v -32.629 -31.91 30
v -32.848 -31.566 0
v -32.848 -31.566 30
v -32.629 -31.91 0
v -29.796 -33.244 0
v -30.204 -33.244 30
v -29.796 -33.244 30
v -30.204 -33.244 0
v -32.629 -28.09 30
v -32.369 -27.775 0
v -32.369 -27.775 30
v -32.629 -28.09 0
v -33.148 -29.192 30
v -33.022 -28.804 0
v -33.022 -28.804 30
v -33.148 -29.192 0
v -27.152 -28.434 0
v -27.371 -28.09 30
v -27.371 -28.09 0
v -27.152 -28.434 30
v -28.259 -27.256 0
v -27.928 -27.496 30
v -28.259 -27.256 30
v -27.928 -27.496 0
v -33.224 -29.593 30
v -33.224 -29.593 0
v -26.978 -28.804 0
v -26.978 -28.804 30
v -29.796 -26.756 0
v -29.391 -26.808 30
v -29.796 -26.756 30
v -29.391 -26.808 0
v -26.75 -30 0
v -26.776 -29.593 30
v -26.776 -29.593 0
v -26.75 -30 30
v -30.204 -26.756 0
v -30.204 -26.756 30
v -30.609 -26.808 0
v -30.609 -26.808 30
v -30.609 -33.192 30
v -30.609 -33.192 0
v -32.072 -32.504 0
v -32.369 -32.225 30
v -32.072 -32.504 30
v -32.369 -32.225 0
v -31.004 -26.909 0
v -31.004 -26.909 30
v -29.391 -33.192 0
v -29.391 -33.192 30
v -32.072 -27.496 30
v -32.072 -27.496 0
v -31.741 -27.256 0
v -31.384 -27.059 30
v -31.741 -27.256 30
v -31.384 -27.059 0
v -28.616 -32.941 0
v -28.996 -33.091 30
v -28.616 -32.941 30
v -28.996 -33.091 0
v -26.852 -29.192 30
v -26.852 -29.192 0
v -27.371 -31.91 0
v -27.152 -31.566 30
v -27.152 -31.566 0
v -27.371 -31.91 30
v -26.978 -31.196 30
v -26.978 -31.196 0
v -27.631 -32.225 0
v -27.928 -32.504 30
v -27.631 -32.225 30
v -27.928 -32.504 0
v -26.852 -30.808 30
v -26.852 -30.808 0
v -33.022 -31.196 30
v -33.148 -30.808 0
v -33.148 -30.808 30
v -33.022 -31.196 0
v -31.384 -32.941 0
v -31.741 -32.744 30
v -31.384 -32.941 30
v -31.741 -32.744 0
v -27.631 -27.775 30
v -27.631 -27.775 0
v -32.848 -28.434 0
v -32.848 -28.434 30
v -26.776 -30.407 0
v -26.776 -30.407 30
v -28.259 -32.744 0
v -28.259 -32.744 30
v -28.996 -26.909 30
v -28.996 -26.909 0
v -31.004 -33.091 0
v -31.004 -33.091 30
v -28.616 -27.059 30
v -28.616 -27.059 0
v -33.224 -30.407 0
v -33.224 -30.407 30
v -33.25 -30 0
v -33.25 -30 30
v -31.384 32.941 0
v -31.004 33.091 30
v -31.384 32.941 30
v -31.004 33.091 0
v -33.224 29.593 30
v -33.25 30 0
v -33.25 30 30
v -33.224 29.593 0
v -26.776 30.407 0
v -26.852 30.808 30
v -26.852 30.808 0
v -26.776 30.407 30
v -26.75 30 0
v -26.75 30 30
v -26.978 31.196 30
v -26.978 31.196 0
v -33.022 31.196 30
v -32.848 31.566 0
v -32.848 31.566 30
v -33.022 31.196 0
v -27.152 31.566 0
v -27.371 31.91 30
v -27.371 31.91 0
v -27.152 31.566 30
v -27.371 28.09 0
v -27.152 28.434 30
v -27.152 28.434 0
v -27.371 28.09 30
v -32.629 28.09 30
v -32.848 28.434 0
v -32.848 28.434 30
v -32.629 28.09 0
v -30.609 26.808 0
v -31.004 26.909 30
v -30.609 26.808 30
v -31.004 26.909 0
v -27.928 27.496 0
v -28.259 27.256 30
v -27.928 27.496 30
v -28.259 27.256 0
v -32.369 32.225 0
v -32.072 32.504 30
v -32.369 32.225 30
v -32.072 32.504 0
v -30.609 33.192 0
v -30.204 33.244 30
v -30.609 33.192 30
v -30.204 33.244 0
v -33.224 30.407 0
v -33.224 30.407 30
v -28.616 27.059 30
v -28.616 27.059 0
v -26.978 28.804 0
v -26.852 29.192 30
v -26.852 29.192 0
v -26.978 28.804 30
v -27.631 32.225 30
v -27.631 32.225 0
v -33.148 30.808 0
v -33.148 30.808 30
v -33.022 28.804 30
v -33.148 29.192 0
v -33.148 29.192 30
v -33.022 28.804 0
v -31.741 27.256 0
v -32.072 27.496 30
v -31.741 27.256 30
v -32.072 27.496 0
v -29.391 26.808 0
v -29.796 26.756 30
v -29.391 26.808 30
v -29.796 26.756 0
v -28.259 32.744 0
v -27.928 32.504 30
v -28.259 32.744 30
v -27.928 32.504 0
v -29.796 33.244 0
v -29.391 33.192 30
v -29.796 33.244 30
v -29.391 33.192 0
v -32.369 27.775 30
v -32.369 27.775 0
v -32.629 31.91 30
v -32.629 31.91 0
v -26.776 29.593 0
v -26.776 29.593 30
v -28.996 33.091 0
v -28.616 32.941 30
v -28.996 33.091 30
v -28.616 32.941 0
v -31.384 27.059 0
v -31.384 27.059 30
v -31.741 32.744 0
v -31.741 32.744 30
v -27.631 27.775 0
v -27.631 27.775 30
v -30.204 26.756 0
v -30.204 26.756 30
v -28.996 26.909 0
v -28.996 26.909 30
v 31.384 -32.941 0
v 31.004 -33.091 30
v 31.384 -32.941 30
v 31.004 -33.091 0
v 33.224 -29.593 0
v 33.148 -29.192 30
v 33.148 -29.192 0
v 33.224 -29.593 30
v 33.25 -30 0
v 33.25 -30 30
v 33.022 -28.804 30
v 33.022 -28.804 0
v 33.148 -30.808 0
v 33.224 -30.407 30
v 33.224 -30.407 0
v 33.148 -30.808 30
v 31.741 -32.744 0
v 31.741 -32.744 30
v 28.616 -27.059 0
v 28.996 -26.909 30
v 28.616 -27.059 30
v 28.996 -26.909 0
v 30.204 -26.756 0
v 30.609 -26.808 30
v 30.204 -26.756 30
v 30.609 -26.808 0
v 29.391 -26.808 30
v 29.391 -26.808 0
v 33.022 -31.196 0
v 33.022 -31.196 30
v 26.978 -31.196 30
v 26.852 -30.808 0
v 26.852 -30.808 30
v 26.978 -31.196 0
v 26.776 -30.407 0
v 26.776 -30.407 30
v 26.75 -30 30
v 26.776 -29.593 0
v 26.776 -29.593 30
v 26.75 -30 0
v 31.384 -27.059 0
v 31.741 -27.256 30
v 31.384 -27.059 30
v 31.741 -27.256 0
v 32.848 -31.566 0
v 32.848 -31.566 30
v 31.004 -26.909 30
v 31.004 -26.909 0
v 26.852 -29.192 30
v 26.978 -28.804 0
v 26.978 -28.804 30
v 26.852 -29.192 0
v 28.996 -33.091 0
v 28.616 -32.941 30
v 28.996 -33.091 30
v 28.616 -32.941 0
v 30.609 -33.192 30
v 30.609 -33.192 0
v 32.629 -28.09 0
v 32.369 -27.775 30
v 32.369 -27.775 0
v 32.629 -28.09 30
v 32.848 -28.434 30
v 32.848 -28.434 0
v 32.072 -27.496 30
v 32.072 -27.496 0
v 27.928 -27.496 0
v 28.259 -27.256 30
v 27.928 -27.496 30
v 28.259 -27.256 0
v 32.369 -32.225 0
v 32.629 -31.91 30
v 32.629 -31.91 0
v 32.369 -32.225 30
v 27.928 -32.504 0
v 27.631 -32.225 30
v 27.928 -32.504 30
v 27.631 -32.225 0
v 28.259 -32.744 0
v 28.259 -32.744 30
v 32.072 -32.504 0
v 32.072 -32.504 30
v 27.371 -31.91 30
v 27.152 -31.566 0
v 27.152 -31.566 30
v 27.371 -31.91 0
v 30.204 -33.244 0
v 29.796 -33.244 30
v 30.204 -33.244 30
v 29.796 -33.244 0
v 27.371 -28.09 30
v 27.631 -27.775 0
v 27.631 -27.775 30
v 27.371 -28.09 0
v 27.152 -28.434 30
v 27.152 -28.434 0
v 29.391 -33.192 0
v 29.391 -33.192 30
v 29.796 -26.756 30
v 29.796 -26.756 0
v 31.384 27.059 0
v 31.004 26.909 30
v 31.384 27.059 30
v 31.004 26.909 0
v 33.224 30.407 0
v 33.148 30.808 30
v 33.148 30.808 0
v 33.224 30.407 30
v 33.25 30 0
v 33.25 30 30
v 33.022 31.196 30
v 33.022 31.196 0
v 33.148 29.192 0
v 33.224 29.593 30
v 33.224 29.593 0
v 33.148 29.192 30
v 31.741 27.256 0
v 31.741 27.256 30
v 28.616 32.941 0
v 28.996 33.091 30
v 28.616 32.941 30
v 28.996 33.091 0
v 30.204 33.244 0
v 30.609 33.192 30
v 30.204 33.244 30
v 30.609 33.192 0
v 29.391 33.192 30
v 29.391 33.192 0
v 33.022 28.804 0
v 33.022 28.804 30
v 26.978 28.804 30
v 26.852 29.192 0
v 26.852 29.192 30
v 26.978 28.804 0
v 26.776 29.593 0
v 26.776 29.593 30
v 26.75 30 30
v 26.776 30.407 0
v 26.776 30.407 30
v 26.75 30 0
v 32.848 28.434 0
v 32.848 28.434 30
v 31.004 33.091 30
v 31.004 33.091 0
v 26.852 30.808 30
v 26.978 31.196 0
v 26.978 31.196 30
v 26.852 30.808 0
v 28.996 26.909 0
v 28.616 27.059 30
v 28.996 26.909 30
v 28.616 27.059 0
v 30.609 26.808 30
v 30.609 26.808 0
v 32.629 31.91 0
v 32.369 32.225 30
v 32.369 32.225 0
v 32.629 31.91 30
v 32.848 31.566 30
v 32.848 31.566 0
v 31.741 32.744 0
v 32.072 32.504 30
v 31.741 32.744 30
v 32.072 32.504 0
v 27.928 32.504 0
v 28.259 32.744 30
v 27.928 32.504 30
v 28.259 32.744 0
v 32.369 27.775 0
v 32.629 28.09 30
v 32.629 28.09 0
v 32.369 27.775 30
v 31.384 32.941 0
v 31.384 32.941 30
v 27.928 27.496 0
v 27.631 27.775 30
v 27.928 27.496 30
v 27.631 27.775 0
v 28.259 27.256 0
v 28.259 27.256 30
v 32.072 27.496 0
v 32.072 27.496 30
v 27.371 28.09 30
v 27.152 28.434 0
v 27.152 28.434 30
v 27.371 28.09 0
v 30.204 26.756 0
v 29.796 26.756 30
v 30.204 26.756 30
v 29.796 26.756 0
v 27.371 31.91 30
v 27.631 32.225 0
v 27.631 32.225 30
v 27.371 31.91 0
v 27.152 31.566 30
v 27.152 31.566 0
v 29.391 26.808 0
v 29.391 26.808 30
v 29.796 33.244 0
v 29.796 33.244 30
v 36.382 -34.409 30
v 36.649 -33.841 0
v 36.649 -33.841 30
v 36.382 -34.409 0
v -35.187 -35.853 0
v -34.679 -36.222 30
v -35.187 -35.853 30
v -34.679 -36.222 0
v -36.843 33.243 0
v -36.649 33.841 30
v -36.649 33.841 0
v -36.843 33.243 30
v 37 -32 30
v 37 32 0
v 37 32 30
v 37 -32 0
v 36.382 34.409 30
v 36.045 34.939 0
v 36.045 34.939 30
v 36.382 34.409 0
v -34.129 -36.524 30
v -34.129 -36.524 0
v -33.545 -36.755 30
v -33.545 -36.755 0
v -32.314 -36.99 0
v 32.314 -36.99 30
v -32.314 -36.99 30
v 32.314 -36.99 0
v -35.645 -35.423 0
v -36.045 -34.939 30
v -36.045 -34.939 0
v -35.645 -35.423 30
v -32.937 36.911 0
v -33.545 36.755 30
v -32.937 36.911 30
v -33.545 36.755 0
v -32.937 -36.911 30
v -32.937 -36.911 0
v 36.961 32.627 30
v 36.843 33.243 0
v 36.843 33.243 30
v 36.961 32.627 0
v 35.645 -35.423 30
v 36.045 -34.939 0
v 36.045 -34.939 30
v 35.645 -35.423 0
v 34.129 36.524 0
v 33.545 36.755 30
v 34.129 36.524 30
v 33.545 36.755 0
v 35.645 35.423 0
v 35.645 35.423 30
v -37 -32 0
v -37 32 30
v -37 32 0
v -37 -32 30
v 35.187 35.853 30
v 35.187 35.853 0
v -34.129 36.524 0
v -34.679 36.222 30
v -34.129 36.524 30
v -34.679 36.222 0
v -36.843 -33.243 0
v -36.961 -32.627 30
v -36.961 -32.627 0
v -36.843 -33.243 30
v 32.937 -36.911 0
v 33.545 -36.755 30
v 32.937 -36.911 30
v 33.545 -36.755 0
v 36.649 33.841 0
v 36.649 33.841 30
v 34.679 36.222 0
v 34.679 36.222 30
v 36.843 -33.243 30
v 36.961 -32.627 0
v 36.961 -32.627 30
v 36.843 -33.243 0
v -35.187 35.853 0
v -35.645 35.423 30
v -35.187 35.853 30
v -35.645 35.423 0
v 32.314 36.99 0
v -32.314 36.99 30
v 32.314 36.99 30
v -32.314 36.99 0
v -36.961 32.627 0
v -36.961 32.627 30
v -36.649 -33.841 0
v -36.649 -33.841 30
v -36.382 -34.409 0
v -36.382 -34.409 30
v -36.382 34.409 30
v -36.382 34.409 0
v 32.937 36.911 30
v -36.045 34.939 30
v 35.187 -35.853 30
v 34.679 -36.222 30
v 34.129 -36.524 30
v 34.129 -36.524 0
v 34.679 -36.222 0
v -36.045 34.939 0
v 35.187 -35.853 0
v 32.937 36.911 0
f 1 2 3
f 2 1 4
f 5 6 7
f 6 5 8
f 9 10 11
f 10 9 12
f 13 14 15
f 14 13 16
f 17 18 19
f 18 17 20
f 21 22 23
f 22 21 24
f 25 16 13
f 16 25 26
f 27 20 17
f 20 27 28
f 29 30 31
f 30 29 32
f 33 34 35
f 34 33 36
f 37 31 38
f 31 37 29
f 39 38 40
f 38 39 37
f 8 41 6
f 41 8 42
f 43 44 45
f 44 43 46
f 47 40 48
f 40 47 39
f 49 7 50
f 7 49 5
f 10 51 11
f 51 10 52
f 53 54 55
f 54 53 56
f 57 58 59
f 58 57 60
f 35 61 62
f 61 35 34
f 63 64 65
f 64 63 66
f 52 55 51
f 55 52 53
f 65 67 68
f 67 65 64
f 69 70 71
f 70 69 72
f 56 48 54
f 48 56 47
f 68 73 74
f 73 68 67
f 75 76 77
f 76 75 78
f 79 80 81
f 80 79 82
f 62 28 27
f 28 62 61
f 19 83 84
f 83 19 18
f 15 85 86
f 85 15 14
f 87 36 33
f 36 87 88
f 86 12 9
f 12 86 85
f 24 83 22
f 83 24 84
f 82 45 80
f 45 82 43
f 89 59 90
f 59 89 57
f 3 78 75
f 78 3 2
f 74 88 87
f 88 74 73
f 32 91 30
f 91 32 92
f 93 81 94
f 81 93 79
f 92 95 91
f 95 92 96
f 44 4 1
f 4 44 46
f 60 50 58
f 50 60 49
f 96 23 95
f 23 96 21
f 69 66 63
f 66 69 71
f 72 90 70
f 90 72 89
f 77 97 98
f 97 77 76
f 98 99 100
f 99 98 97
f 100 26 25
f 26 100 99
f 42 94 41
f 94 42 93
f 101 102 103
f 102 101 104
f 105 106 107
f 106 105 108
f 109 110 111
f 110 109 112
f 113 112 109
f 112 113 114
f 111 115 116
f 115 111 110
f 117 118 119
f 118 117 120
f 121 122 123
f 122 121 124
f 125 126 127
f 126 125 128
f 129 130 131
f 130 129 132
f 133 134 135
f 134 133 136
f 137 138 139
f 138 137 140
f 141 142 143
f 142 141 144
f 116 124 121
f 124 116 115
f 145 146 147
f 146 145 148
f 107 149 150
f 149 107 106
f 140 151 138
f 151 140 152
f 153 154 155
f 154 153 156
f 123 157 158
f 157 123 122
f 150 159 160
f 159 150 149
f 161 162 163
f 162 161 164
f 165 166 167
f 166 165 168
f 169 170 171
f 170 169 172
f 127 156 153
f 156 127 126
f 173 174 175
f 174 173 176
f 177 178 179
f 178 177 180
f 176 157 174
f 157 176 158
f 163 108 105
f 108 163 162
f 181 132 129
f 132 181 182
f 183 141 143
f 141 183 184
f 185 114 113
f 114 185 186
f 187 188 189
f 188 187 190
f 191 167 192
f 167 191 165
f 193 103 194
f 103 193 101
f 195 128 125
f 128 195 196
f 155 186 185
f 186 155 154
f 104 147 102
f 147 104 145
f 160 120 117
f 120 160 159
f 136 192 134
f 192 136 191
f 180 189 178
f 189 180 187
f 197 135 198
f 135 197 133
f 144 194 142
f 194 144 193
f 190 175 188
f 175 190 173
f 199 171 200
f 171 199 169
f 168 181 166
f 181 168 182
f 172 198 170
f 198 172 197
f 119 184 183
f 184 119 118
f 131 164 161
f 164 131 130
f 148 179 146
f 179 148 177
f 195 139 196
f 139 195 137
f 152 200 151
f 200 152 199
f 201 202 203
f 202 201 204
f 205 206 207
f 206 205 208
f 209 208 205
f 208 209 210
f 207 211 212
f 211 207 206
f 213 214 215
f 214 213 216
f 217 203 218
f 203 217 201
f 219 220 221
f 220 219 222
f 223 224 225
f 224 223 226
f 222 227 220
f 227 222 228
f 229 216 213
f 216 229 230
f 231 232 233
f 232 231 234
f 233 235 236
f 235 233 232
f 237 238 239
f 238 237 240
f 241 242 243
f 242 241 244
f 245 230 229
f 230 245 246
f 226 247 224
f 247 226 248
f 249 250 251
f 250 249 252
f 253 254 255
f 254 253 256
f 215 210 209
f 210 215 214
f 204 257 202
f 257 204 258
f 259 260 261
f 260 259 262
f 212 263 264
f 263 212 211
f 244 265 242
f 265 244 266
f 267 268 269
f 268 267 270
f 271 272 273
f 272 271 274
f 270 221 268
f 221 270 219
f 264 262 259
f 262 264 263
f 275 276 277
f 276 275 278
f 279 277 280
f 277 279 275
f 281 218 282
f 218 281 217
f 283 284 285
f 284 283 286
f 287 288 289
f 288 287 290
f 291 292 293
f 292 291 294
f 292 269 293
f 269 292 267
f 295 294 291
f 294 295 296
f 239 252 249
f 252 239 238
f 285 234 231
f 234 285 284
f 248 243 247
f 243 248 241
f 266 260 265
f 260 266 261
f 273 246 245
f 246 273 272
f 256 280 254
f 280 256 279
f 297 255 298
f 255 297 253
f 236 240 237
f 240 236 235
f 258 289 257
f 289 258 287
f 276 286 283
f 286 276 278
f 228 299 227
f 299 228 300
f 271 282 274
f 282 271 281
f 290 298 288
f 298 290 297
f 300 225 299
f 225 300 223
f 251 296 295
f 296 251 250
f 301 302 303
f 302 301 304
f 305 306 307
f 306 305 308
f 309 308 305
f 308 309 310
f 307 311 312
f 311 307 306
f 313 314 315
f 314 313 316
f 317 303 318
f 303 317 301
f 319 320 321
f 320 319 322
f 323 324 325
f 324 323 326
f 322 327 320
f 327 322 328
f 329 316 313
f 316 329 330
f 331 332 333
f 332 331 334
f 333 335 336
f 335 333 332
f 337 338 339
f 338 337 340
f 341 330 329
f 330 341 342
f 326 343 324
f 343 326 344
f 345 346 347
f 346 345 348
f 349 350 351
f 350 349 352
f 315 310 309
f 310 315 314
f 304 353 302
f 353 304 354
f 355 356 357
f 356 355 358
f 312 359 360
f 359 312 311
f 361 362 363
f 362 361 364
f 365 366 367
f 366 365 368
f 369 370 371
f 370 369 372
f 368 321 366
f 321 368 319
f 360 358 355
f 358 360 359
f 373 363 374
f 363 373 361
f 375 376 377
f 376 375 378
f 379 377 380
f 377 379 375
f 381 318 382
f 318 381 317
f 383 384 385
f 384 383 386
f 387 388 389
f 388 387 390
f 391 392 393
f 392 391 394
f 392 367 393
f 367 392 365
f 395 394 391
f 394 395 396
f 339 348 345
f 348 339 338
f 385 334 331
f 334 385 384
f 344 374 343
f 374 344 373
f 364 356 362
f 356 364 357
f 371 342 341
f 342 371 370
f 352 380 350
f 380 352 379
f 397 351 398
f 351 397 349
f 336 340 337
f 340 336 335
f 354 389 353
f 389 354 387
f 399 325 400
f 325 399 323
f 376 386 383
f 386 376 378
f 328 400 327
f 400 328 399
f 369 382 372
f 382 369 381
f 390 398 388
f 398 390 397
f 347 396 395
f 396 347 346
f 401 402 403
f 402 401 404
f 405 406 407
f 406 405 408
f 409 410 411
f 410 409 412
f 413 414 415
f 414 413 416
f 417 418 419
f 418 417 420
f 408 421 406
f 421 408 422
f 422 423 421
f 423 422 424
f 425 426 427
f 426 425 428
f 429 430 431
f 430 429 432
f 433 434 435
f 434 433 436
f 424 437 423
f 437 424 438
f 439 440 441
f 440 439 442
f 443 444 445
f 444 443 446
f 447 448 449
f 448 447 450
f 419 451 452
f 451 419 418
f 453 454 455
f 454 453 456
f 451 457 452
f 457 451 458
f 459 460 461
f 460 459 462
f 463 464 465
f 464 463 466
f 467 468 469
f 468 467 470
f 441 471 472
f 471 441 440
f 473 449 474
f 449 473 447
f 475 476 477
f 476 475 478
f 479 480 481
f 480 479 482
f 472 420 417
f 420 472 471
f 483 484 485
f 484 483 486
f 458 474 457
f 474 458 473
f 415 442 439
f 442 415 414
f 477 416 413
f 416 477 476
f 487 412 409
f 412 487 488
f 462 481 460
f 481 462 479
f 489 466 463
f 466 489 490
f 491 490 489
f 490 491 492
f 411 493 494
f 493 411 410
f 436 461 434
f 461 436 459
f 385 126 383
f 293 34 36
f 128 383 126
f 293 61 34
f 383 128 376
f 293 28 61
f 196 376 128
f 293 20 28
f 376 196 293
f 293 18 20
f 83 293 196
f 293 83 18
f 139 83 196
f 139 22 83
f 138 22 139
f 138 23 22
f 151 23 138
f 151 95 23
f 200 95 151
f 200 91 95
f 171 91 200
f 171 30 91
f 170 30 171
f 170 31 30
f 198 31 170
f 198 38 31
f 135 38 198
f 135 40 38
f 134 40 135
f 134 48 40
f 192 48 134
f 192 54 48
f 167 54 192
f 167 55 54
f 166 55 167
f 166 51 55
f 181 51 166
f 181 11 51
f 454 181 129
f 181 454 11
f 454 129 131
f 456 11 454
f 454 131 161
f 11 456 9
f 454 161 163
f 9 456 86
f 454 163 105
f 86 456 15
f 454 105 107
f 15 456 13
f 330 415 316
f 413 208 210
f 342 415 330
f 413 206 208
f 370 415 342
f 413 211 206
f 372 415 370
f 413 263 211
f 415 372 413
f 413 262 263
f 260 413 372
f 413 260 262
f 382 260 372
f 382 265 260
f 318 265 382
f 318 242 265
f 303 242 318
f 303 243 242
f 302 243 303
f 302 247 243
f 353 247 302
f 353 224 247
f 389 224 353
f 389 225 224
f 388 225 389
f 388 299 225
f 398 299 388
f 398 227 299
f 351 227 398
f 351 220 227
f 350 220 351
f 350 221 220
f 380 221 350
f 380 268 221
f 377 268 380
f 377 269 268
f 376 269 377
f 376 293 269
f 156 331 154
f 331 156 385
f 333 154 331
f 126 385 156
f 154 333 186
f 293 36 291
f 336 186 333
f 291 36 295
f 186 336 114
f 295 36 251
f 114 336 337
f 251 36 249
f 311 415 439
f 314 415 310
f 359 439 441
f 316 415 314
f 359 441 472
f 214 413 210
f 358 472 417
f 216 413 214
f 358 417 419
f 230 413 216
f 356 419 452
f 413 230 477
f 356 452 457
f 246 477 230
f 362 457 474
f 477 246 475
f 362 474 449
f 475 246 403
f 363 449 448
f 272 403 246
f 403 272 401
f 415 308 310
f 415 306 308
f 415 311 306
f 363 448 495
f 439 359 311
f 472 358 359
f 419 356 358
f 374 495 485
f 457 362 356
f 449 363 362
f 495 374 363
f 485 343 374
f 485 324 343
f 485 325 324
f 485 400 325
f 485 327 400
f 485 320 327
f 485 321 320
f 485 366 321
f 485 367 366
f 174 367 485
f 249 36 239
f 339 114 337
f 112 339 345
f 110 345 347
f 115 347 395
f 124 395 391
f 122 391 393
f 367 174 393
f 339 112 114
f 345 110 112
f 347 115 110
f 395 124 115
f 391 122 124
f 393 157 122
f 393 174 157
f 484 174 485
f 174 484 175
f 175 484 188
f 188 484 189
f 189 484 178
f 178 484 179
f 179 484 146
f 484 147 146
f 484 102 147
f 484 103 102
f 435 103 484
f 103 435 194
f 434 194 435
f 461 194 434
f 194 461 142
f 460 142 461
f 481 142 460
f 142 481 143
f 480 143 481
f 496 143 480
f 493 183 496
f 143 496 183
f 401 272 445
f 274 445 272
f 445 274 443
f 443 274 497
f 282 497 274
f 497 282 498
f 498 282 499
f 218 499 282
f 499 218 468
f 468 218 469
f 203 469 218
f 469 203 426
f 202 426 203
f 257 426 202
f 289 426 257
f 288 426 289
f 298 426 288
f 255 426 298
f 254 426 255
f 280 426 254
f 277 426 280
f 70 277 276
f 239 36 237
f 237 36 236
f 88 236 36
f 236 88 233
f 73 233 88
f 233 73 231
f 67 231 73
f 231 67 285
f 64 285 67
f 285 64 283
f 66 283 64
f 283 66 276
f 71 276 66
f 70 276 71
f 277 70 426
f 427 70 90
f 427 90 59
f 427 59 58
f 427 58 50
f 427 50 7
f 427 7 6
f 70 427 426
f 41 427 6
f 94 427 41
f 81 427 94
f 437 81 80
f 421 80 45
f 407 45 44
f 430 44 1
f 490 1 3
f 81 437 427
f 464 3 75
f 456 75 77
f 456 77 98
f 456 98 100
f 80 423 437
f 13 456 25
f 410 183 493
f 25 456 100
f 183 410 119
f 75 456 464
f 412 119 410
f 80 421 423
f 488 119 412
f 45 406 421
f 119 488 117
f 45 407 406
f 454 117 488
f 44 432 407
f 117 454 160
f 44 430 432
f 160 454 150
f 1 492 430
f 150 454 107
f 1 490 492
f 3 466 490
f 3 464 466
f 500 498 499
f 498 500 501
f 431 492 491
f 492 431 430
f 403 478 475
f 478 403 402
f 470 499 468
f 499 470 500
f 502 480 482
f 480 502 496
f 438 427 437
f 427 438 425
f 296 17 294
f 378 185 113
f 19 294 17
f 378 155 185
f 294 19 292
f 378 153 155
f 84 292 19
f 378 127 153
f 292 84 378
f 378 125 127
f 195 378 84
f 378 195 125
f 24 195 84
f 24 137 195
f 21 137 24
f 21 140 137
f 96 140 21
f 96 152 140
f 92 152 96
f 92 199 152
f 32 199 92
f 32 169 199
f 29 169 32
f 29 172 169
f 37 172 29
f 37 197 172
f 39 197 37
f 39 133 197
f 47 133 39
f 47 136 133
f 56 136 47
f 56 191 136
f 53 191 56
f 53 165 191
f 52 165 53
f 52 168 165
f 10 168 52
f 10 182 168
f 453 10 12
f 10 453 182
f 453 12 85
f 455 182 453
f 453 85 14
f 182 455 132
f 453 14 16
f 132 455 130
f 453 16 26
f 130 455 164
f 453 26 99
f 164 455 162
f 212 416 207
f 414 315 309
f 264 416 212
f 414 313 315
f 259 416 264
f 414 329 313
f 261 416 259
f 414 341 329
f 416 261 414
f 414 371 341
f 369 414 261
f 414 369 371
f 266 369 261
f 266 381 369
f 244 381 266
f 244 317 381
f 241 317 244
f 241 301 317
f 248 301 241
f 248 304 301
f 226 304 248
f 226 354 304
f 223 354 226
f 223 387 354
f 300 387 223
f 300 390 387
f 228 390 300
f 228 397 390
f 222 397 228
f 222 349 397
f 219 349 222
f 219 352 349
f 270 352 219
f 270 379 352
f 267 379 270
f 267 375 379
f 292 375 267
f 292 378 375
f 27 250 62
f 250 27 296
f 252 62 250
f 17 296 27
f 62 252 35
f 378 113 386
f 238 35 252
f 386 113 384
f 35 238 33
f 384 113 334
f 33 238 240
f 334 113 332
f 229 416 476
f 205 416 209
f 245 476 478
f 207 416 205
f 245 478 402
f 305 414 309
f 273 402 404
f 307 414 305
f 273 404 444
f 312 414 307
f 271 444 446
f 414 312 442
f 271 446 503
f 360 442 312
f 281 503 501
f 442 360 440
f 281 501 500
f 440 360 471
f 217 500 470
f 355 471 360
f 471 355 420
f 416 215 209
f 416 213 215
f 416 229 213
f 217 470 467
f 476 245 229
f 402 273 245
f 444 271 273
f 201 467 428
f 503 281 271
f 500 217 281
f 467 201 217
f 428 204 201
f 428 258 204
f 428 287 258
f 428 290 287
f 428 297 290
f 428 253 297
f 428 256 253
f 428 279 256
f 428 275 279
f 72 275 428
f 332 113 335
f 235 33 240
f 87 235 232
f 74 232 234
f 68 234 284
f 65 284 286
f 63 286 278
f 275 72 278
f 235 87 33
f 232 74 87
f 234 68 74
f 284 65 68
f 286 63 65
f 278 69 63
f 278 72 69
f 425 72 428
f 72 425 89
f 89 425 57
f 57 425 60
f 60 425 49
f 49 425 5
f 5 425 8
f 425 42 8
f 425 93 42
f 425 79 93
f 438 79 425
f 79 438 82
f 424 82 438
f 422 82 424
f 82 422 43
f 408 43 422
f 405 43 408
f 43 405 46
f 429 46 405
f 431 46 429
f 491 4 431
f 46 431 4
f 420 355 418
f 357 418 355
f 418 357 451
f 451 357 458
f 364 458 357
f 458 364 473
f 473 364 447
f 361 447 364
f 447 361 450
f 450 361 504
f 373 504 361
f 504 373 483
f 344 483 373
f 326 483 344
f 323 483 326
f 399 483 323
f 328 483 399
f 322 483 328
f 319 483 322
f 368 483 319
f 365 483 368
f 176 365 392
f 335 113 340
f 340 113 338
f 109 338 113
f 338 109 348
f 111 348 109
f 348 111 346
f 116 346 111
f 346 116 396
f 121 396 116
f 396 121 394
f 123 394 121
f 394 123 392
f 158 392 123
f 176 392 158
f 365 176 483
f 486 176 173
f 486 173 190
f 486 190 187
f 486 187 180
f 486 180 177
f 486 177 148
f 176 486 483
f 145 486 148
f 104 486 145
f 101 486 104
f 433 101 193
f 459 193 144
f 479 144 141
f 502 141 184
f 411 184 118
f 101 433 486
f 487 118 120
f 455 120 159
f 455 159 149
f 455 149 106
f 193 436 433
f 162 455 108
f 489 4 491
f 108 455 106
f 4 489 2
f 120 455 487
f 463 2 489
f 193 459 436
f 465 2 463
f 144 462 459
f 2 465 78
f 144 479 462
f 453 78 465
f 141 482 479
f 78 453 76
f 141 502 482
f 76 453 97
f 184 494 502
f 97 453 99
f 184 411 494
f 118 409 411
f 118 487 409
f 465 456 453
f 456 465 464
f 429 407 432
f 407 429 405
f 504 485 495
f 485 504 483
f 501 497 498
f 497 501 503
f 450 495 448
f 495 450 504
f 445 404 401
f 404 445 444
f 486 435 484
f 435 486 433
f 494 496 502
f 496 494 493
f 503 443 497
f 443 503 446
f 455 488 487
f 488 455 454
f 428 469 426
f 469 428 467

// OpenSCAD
$fn = 50;


difference() {
	union() {
		hull() {
			translate(v = [-32.0000000000, 32.0000000000, 0]) {
				cylinder(h = 30, r = 5);
			}
			translate(v = [32.0000000000, 32.0000000000, 0]) {
				cylinder(h = 30, r = 5);
			}
			translate(v = [-32.0000000000, -32.0000000000, 0]) {
				cylinder(h = 30, r = 5);
			}
			translate(v = [32.0000000000, -32.0000000000, 0]) {
				cylinder(h = 30, r = 5);
			}
		}
	}
	union() {
		translate(v = [-30.0000000000, -30.0000000000, -100.0000000000]) {
			cylinder(h = 200, r = 3.2500000000);
		}
		translate(v = [-30.0000000000, 30.0000000000, -100.0000000000]) {
			cylinder(h = 200, r = 3.2500000000);
		}
		translate(v = [30.0000000000, -30.0000000000, -100.0000000000]) {
			cylinder(h = 200, r = 3.2500000000);
		}
		translate(v = [30.0000000000, 30.0000000000, -100.0000000000]) {
			cylinder(h = 200, r = 3.2500000000);
		}
	}
}
